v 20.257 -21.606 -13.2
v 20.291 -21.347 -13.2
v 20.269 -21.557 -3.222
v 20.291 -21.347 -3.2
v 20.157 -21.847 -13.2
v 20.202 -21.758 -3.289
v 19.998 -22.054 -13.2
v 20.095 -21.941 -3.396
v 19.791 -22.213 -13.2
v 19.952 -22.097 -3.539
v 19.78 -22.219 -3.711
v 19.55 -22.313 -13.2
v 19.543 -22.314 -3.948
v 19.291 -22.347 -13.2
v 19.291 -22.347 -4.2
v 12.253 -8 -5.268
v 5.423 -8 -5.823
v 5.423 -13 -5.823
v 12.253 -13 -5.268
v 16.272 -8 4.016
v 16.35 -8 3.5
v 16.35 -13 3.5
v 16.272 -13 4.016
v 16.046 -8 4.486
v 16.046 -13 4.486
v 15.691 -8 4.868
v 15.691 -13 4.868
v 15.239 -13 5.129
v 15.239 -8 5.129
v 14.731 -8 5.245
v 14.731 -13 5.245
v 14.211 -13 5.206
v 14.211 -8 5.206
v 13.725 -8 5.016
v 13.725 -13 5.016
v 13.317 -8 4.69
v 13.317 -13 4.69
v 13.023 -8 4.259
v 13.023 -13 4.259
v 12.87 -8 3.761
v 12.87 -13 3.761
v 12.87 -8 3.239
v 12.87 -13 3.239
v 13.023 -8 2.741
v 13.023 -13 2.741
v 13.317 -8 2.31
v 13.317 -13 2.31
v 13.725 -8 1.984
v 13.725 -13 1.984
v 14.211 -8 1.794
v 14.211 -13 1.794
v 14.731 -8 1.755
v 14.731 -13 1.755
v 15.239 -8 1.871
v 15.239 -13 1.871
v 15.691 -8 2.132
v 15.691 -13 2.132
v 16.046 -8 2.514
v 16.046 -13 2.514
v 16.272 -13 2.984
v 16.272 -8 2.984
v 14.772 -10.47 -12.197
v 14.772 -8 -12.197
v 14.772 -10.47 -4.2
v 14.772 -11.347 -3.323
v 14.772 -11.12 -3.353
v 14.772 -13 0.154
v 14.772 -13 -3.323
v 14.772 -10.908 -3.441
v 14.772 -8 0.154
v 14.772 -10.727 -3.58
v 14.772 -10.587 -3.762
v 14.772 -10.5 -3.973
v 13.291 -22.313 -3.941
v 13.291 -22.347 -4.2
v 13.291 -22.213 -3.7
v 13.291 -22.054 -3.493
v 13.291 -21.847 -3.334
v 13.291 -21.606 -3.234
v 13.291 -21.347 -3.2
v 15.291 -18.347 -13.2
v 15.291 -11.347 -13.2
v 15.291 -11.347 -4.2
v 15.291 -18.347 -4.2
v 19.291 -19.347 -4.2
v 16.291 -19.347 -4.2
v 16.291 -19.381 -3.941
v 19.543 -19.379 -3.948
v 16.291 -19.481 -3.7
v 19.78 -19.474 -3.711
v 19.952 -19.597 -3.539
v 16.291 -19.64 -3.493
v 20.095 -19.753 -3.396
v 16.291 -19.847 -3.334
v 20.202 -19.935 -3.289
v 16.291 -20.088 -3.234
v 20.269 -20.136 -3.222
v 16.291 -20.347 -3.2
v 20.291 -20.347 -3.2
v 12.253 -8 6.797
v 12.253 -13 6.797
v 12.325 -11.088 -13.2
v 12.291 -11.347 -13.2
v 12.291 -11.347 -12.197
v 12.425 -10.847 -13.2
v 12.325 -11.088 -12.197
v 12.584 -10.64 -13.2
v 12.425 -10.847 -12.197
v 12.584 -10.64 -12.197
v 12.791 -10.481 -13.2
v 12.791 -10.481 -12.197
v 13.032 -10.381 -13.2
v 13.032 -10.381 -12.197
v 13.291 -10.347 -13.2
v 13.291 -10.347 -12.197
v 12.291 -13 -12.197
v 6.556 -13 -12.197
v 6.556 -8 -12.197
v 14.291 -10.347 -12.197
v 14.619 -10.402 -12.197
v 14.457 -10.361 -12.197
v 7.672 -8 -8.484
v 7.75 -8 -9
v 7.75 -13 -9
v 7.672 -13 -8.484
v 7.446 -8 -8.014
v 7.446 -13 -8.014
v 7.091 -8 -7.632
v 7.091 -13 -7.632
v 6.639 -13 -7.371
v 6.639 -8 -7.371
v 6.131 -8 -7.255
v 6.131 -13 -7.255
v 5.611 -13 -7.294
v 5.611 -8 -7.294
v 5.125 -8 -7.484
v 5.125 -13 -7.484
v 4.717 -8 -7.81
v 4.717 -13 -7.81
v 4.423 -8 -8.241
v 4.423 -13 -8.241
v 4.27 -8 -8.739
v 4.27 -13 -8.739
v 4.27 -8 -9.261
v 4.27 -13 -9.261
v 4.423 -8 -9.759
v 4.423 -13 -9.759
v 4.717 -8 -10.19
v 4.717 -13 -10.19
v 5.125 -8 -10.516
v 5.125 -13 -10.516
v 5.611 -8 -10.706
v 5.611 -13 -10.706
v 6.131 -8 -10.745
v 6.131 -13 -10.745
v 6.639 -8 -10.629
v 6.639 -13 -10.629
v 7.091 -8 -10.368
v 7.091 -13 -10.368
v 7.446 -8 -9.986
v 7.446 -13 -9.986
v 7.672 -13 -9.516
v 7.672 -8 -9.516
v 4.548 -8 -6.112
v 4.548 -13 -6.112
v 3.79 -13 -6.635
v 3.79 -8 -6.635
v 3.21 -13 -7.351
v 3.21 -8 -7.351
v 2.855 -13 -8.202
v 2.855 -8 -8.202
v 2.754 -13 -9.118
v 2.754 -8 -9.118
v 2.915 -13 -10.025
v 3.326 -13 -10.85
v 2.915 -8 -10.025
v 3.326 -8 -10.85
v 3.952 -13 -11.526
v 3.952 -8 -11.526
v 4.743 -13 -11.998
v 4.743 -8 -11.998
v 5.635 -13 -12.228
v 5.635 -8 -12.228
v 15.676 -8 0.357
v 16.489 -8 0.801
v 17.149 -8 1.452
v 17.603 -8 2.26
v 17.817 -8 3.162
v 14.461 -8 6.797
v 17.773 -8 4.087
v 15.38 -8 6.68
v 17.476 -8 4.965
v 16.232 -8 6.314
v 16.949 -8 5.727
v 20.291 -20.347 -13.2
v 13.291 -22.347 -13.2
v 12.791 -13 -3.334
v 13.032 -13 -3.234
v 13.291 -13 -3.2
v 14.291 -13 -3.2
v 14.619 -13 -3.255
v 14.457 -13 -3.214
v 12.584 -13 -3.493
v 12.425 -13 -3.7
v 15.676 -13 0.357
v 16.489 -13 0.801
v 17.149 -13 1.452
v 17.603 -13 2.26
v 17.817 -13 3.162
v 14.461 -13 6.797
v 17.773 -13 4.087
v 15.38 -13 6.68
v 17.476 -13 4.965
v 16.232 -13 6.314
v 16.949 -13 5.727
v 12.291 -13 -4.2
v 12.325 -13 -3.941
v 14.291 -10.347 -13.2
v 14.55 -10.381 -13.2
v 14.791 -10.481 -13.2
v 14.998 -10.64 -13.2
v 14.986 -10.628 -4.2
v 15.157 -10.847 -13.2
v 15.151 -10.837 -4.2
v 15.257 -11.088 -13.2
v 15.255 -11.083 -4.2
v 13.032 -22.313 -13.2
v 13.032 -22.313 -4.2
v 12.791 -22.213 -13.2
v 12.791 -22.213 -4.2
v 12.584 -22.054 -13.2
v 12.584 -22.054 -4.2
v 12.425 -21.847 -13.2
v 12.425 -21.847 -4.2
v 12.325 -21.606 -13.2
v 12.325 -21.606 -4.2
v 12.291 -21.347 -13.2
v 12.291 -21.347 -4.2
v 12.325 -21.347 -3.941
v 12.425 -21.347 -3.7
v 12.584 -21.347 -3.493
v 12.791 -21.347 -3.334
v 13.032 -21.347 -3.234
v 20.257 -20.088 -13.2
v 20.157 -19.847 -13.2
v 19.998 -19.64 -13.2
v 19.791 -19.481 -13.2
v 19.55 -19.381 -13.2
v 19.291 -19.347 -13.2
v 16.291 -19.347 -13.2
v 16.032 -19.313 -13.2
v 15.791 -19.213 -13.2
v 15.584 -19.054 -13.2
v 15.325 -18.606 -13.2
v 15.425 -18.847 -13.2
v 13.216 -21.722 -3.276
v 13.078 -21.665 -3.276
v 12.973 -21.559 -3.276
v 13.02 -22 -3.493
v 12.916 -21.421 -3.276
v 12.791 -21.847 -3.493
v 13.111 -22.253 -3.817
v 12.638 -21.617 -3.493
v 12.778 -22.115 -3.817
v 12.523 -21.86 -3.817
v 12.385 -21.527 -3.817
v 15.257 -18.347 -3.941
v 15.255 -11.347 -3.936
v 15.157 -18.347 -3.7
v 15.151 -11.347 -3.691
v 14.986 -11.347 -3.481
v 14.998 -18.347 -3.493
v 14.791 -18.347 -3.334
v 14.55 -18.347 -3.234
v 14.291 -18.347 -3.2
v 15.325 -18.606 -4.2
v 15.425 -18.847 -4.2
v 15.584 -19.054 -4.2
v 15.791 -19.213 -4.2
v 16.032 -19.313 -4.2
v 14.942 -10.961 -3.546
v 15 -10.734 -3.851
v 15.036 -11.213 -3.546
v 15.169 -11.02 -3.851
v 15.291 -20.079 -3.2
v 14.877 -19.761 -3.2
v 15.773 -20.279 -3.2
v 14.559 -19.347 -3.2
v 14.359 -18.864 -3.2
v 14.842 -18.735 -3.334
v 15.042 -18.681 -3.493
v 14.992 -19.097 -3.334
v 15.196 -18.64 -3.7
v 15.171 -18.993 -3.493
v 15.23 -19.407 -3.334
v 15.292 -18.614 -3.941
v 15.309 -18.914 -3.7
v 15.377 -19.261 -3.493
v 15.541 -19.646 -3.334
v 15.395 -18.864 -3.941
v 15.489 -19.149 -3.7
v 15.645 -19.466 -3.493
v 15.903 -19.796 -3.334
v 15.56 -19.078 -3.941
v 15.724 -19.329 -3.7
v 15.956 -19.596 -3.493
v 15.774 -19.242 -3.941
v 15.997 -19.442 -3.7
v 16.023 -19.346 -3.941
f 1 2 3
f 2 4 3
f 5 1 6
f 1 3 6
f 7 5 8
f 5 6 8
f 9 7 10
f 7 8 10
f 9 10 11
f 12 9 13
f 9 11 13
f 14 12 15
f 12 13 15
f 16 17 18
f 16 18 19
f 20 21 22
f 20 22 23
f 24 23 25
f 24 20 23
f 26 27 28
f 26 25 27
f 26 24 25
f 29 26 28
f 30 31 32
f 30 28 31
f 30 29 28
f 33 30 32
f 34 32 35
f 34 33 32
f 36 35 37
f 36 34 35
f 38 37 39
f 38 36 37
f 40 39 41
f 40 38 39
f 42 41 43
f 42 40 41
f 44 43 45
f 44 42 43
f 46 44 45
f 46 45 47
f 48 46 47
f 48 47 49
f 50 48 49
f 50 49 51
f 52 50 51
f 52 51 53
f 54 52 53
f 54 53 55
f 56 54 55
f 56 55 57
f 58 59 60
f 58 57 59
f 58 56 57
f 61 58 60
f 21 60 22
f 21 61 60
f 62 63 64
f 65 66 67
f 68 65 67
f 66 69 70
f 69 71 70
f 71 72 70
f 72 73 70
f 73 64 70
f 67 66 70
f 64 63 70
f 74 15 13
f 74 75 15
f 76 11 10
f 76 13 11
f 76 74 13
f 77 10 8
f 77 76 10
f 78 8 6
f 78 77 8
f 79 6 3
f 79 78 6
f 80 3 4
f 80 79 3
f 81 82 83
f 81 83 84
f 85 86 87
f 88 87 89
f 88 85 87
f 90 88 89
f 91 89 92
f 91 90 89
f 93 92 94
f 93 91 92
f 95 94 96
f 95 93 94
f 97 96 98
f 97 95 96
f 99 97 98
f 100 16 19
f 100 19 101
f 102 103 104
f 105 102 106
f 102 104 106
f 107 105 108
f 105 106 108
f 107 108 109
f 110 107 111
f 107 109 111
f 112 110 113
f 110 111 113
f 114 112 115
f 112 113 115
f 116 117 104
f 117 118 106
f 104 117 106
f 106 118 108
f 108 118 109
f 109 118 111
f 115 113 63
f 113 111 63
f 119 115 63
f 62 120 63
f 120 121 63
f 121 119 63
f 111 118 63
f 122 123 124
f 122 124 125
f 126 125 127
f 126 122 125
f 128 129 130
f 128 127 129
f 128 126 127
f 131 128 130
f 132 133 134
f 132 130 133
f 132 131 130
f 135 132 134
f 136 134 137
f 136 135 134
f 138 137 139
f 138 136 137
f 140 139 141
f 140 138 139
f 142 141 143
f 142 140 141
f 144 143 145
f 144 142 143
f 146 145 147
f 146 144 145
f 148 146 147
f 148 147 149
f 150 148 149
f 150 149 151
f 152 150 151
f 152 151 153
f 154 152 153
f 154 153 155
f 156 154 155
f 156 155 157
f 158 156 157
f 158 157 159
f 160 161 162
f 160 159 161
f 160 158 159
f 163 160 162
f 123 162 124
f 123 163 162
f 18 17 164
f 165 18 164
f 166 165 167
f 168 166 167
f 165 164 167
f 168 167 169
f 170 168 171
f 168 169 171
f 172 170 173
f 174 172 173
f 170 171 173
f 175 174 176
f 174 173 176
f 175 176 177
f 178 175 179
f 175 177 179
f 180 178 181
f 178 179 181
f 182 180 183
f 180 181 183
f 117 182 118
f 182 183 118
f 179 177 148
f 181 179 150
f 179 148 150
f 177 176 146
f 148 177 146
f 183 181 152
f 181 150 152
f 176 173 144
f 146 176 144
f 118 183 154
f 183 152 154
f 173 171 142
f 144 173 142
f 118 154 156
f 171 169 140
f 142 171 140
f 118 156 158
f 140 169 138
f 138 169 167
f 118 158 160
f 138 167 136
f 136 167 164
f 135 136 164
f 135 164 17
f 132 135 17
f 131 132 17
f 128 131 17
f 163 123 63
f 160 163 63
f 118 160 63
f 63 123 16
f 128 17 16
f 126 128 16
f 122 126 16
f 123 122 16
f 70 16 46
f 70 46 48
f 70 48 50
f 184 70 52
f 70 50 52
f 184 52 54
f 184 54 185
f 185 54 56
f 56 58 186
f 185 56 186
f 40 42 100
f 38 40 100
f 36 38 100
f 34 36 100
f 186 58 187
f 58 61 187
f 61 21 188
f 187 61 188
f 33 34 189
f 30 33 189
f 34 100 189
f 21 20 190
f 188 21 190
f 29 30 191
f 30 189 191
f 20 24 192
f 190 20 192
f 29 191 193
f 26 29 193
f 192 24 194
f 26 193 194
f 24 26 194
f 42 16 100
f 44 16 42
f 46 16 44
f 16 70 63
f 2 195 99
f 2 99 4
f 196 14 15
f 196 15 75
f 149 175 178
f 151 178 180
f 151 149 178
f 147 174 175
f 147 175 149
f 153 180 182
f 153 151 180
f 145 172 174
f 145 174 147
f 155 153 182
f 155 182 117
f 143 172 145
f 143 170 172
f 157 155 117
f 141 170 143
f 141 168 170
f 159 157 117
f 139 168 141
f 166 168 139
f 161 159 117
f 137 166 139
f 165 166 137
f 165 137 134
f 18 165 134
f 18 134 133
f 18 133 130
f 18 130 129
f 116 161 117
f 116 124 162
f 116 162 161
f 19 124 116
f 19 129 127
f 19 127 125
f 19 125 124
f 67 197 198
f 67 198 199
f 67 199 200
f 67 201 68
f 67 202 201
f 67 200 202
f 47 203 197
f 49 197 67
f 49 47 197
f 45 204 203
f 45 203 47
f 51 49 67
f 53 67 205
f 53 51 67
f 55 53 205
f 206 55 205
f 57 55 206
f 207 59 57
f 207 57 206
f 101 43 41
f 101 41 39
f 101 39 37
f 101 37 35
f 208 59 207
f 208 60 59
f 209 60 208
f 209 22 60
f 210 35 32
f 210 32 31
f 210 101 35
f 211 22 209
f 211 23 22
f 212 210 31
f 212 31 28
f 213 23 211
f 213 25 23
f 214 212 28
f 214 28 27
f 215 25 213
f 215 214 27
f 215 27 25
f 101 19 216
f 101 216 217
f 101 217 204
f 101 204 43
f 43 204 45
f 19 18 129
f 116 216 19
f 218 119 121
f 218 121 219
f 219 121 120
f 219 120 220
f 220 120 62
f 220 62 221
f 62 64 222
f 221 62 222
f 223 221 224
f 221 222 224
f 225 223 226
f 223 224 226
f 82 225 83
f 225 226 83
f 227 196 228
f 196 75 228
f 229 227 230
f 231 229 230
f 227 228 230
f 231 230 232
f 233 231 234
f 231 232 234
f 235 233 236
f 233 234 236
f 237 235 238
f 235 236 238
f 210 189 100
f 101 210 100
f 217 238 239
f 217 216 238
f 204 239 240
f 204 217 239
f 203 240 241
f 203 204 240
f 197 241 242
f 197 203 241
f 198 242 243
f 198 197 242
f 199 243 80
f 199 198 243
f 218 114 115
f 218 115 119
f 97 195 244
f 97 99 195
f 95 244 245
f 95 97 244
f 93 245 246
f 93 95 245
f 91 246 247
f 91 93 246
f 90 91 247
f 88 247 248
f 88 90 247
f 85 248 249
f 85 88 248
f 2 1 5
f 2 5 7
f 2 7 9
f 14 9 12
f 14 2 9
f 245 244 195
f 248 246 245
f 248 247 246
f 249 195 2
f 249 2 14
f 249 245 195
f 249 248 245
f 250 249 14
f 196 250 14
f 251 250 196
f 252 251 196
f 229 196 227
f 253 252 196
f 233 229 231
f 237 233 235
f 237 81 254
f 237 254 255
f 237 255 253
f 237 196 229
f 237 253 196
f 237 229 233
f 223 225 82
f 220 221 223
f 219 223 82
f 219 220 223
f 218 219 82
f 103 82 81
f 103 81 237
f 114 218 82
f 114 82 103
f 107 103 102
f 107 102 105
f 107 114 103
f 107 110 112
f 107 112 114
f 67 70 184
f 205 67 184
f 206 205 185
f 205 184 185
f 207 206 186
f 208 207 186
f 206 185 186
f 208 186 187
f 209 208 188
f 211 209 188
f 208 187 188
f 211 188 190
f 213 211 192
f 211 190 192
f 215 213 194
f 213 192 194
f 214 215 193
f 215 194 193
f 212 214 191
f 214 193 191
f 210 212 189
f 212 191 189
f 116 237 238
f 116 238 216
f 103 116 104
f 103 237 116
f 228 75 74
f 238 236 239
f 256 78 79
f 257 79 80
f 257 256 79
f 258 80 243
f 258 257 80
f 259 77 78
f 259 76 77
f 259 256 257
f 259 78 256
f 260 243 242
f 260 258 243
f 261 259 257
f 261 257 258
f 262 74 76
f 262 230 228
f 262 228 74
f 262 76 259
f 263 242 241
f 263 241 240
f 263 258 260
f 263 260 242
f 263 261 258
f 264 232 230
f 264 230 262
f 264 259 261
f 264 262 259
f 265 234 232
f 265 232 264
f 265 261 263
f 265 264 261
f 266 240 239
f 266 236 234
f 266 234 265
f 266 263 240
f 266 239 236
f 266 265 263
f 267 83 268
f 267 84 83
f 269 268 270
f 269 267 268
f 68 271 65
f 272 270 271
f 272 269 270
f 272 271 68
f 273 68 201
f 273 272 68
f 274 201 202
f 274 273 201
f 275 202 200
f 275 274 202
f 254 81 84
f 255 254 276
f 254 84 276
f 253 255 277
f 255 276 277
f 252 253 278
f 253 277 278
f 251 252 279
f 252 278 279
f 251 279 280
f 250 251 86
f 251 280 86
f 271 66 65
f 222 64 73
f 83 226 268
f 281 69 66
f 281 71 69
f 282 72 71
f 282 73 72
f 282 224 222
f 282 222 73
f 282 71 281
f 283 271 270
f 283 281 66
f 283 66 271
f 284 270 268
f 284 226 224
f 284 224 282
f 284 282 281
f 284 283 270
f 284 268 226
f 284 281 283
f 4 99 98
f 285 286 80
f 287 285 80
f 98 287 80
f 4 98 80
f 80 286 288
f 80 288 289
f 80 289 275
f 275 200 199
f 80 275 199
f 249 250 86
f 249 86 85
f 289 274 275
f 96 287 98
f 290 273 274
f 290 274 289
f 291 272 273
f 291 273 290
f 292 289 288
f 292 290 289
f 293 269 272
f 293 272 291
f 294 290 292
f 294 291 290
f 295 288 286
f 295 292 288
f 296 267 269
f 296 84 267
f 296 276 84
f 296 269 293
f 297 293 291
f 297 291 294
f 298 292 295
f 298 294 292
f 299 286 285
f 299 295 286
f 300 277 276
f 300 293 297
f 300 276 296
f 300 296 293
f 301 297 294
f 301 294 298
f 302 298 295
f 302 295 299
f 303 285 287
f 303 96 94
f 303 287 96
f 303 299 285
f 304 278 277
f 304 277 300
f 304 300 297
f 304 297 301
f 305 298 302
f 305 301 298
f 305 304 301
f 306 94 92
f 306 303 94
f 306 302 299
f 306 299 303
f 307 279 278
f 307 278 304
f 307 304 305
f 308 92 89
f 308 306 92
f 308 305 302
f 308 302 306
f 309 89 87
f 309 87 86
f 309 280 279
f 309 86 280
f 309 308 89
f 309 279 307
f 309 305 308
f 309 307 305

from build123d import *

# Parameters (mm, degrees)
CYLINDER054_R     = 1.75
CYLINDER054_DEPTH = 15
CYLINDER051_R     = 1.75
CYLINDER051_DEPTH = 15
EXTRUDE003_DEPTH  = 10
FILLET021_R       = 1
EXTRUDE004_DEPTH  = 5


with BuildPart() as m3holds022:
    # Cylinder054 → Cylinder054 (new body)
    with BuildSketch(Plane(origin=(6, 0.25, -9), x_dir=(1, 0, 0), z_dir=(0, -1, 0))):
        Circle(CYLINDER054_R)
    extrude(amount=CYLINDER054_DEPTH)


with BuildPart() as fusion065:
    # Cylinder051 → Cylinder051 (new body)
    with BuildSketch(Plane(origin=(14.6, 0.25, 3.5), x_dir=(1, 0, 0), z_dir=(0, -1, 0))):
        Circle(CYLINDER051_R)
    extrude(amount=CYLINDER051_DEPTH)

    # Fusion065: union m3Holds022
    add(m3holds022.part)


with BuildPart() as fillet021:
    # Sketch005 → Extrude003 (new body)
    with BuildSketch(Plane.XY):
        Polygon((57.709053, -19.346786), (57.709053, -22.346786), (65.709053, -22.346786), (65.709053, -10.346786), (62.709053, -10.346786), (62.709053, -19.346786), align=None)
    extrude(amount=EXTRUDE003_DEPTH)


with BuildPart() as fillet021_1:
    # Extrude003 placement: moved
    add(fillet021.part.moved(Location((0, 0, -14))))

    # Fillet021
    fillet021_edges = [fillet021_1.edges().sort_by_distance(p)[0] for p in [
        (57.709053, -19.346786, -9),
        (57.709053, -22.346786, -9),
        (65.709053, -22.346786, -9),
        (61.709053, -22.346786, -4),
        (65.709053, -10.346786, -9),
        (65.709053, -16.346786, -4),
        (62.709053, -10.346786, -9),
        (64.209053, -10.346786, -4),
        (62.709053, -19.346786, -9),
        (62.709053, -14.846786, -4),
        (60.209053, -19.346786, -4),
    ]]
    fillet(fillet021_edges, radius=FILLET021_R)


with BuildPart() as fillet021_2:
    # Fillet021 placement: moved
    add(fillet021_1.part.moved(Location((0, 0, 0.4))))


with BuildPart() as part_mirroring005:
    # Part__Mirroring005: instance of Fillet021
    add(fillet021_2.part.mirror(Plane(origin=(0, 0, 0), x_dir=(0, -1, 0), z_dir=(1, 0, 0))))


with BuildPart() as part_mirroring005_1:
    # Part__Mirroring005 placement: moved
    add(part_mirroring005.part.moved(Location((78, 0, 0.4))))


with BuildPart() as c4holdbottomleft:
    # Sketch006 → Extrude004 (new body)
    with BuildSketch(Plane.XZ):
        with BuildLine():
            ThreePointArc((14.771842, 0.154152), (17.827348, 3.62591), (14.461083, 6.797264))
            Line((14.461083, 6.797264), (12.252875, 6.797264))
            Line((12.252875, -5.267611), (12.252875, 6.797264))
            Line((5.422805, -5.82309), (12.252875, -5.267611))
            ThreePointArc((5.422805, -5.82309), (2.802341, -9.576998), (6.556249, -12.197462))
            Line((6.556249, -12.197462), (14.771842, -12.197462))
            Line((14.771842, -12.197462), (14.771842, 0.154152))
        make_face()
    extrude(amount=EXTRUDE004_DEPTH)


with BuildPart() as c4holdbottomleft_1:
    # Extrude004 placement: moved
    add(c4holdbottomleft.part.moved(Location((0, -8, 0))))

    # Fusion067: union Part__Mirroring005
    add(part_mirroring005_1.part)

    # Cut013: cut Fusion065
    add(fusion065.part, mode=Mode.SUBTRACT)


solid = c4holdbottomleft_1.part
